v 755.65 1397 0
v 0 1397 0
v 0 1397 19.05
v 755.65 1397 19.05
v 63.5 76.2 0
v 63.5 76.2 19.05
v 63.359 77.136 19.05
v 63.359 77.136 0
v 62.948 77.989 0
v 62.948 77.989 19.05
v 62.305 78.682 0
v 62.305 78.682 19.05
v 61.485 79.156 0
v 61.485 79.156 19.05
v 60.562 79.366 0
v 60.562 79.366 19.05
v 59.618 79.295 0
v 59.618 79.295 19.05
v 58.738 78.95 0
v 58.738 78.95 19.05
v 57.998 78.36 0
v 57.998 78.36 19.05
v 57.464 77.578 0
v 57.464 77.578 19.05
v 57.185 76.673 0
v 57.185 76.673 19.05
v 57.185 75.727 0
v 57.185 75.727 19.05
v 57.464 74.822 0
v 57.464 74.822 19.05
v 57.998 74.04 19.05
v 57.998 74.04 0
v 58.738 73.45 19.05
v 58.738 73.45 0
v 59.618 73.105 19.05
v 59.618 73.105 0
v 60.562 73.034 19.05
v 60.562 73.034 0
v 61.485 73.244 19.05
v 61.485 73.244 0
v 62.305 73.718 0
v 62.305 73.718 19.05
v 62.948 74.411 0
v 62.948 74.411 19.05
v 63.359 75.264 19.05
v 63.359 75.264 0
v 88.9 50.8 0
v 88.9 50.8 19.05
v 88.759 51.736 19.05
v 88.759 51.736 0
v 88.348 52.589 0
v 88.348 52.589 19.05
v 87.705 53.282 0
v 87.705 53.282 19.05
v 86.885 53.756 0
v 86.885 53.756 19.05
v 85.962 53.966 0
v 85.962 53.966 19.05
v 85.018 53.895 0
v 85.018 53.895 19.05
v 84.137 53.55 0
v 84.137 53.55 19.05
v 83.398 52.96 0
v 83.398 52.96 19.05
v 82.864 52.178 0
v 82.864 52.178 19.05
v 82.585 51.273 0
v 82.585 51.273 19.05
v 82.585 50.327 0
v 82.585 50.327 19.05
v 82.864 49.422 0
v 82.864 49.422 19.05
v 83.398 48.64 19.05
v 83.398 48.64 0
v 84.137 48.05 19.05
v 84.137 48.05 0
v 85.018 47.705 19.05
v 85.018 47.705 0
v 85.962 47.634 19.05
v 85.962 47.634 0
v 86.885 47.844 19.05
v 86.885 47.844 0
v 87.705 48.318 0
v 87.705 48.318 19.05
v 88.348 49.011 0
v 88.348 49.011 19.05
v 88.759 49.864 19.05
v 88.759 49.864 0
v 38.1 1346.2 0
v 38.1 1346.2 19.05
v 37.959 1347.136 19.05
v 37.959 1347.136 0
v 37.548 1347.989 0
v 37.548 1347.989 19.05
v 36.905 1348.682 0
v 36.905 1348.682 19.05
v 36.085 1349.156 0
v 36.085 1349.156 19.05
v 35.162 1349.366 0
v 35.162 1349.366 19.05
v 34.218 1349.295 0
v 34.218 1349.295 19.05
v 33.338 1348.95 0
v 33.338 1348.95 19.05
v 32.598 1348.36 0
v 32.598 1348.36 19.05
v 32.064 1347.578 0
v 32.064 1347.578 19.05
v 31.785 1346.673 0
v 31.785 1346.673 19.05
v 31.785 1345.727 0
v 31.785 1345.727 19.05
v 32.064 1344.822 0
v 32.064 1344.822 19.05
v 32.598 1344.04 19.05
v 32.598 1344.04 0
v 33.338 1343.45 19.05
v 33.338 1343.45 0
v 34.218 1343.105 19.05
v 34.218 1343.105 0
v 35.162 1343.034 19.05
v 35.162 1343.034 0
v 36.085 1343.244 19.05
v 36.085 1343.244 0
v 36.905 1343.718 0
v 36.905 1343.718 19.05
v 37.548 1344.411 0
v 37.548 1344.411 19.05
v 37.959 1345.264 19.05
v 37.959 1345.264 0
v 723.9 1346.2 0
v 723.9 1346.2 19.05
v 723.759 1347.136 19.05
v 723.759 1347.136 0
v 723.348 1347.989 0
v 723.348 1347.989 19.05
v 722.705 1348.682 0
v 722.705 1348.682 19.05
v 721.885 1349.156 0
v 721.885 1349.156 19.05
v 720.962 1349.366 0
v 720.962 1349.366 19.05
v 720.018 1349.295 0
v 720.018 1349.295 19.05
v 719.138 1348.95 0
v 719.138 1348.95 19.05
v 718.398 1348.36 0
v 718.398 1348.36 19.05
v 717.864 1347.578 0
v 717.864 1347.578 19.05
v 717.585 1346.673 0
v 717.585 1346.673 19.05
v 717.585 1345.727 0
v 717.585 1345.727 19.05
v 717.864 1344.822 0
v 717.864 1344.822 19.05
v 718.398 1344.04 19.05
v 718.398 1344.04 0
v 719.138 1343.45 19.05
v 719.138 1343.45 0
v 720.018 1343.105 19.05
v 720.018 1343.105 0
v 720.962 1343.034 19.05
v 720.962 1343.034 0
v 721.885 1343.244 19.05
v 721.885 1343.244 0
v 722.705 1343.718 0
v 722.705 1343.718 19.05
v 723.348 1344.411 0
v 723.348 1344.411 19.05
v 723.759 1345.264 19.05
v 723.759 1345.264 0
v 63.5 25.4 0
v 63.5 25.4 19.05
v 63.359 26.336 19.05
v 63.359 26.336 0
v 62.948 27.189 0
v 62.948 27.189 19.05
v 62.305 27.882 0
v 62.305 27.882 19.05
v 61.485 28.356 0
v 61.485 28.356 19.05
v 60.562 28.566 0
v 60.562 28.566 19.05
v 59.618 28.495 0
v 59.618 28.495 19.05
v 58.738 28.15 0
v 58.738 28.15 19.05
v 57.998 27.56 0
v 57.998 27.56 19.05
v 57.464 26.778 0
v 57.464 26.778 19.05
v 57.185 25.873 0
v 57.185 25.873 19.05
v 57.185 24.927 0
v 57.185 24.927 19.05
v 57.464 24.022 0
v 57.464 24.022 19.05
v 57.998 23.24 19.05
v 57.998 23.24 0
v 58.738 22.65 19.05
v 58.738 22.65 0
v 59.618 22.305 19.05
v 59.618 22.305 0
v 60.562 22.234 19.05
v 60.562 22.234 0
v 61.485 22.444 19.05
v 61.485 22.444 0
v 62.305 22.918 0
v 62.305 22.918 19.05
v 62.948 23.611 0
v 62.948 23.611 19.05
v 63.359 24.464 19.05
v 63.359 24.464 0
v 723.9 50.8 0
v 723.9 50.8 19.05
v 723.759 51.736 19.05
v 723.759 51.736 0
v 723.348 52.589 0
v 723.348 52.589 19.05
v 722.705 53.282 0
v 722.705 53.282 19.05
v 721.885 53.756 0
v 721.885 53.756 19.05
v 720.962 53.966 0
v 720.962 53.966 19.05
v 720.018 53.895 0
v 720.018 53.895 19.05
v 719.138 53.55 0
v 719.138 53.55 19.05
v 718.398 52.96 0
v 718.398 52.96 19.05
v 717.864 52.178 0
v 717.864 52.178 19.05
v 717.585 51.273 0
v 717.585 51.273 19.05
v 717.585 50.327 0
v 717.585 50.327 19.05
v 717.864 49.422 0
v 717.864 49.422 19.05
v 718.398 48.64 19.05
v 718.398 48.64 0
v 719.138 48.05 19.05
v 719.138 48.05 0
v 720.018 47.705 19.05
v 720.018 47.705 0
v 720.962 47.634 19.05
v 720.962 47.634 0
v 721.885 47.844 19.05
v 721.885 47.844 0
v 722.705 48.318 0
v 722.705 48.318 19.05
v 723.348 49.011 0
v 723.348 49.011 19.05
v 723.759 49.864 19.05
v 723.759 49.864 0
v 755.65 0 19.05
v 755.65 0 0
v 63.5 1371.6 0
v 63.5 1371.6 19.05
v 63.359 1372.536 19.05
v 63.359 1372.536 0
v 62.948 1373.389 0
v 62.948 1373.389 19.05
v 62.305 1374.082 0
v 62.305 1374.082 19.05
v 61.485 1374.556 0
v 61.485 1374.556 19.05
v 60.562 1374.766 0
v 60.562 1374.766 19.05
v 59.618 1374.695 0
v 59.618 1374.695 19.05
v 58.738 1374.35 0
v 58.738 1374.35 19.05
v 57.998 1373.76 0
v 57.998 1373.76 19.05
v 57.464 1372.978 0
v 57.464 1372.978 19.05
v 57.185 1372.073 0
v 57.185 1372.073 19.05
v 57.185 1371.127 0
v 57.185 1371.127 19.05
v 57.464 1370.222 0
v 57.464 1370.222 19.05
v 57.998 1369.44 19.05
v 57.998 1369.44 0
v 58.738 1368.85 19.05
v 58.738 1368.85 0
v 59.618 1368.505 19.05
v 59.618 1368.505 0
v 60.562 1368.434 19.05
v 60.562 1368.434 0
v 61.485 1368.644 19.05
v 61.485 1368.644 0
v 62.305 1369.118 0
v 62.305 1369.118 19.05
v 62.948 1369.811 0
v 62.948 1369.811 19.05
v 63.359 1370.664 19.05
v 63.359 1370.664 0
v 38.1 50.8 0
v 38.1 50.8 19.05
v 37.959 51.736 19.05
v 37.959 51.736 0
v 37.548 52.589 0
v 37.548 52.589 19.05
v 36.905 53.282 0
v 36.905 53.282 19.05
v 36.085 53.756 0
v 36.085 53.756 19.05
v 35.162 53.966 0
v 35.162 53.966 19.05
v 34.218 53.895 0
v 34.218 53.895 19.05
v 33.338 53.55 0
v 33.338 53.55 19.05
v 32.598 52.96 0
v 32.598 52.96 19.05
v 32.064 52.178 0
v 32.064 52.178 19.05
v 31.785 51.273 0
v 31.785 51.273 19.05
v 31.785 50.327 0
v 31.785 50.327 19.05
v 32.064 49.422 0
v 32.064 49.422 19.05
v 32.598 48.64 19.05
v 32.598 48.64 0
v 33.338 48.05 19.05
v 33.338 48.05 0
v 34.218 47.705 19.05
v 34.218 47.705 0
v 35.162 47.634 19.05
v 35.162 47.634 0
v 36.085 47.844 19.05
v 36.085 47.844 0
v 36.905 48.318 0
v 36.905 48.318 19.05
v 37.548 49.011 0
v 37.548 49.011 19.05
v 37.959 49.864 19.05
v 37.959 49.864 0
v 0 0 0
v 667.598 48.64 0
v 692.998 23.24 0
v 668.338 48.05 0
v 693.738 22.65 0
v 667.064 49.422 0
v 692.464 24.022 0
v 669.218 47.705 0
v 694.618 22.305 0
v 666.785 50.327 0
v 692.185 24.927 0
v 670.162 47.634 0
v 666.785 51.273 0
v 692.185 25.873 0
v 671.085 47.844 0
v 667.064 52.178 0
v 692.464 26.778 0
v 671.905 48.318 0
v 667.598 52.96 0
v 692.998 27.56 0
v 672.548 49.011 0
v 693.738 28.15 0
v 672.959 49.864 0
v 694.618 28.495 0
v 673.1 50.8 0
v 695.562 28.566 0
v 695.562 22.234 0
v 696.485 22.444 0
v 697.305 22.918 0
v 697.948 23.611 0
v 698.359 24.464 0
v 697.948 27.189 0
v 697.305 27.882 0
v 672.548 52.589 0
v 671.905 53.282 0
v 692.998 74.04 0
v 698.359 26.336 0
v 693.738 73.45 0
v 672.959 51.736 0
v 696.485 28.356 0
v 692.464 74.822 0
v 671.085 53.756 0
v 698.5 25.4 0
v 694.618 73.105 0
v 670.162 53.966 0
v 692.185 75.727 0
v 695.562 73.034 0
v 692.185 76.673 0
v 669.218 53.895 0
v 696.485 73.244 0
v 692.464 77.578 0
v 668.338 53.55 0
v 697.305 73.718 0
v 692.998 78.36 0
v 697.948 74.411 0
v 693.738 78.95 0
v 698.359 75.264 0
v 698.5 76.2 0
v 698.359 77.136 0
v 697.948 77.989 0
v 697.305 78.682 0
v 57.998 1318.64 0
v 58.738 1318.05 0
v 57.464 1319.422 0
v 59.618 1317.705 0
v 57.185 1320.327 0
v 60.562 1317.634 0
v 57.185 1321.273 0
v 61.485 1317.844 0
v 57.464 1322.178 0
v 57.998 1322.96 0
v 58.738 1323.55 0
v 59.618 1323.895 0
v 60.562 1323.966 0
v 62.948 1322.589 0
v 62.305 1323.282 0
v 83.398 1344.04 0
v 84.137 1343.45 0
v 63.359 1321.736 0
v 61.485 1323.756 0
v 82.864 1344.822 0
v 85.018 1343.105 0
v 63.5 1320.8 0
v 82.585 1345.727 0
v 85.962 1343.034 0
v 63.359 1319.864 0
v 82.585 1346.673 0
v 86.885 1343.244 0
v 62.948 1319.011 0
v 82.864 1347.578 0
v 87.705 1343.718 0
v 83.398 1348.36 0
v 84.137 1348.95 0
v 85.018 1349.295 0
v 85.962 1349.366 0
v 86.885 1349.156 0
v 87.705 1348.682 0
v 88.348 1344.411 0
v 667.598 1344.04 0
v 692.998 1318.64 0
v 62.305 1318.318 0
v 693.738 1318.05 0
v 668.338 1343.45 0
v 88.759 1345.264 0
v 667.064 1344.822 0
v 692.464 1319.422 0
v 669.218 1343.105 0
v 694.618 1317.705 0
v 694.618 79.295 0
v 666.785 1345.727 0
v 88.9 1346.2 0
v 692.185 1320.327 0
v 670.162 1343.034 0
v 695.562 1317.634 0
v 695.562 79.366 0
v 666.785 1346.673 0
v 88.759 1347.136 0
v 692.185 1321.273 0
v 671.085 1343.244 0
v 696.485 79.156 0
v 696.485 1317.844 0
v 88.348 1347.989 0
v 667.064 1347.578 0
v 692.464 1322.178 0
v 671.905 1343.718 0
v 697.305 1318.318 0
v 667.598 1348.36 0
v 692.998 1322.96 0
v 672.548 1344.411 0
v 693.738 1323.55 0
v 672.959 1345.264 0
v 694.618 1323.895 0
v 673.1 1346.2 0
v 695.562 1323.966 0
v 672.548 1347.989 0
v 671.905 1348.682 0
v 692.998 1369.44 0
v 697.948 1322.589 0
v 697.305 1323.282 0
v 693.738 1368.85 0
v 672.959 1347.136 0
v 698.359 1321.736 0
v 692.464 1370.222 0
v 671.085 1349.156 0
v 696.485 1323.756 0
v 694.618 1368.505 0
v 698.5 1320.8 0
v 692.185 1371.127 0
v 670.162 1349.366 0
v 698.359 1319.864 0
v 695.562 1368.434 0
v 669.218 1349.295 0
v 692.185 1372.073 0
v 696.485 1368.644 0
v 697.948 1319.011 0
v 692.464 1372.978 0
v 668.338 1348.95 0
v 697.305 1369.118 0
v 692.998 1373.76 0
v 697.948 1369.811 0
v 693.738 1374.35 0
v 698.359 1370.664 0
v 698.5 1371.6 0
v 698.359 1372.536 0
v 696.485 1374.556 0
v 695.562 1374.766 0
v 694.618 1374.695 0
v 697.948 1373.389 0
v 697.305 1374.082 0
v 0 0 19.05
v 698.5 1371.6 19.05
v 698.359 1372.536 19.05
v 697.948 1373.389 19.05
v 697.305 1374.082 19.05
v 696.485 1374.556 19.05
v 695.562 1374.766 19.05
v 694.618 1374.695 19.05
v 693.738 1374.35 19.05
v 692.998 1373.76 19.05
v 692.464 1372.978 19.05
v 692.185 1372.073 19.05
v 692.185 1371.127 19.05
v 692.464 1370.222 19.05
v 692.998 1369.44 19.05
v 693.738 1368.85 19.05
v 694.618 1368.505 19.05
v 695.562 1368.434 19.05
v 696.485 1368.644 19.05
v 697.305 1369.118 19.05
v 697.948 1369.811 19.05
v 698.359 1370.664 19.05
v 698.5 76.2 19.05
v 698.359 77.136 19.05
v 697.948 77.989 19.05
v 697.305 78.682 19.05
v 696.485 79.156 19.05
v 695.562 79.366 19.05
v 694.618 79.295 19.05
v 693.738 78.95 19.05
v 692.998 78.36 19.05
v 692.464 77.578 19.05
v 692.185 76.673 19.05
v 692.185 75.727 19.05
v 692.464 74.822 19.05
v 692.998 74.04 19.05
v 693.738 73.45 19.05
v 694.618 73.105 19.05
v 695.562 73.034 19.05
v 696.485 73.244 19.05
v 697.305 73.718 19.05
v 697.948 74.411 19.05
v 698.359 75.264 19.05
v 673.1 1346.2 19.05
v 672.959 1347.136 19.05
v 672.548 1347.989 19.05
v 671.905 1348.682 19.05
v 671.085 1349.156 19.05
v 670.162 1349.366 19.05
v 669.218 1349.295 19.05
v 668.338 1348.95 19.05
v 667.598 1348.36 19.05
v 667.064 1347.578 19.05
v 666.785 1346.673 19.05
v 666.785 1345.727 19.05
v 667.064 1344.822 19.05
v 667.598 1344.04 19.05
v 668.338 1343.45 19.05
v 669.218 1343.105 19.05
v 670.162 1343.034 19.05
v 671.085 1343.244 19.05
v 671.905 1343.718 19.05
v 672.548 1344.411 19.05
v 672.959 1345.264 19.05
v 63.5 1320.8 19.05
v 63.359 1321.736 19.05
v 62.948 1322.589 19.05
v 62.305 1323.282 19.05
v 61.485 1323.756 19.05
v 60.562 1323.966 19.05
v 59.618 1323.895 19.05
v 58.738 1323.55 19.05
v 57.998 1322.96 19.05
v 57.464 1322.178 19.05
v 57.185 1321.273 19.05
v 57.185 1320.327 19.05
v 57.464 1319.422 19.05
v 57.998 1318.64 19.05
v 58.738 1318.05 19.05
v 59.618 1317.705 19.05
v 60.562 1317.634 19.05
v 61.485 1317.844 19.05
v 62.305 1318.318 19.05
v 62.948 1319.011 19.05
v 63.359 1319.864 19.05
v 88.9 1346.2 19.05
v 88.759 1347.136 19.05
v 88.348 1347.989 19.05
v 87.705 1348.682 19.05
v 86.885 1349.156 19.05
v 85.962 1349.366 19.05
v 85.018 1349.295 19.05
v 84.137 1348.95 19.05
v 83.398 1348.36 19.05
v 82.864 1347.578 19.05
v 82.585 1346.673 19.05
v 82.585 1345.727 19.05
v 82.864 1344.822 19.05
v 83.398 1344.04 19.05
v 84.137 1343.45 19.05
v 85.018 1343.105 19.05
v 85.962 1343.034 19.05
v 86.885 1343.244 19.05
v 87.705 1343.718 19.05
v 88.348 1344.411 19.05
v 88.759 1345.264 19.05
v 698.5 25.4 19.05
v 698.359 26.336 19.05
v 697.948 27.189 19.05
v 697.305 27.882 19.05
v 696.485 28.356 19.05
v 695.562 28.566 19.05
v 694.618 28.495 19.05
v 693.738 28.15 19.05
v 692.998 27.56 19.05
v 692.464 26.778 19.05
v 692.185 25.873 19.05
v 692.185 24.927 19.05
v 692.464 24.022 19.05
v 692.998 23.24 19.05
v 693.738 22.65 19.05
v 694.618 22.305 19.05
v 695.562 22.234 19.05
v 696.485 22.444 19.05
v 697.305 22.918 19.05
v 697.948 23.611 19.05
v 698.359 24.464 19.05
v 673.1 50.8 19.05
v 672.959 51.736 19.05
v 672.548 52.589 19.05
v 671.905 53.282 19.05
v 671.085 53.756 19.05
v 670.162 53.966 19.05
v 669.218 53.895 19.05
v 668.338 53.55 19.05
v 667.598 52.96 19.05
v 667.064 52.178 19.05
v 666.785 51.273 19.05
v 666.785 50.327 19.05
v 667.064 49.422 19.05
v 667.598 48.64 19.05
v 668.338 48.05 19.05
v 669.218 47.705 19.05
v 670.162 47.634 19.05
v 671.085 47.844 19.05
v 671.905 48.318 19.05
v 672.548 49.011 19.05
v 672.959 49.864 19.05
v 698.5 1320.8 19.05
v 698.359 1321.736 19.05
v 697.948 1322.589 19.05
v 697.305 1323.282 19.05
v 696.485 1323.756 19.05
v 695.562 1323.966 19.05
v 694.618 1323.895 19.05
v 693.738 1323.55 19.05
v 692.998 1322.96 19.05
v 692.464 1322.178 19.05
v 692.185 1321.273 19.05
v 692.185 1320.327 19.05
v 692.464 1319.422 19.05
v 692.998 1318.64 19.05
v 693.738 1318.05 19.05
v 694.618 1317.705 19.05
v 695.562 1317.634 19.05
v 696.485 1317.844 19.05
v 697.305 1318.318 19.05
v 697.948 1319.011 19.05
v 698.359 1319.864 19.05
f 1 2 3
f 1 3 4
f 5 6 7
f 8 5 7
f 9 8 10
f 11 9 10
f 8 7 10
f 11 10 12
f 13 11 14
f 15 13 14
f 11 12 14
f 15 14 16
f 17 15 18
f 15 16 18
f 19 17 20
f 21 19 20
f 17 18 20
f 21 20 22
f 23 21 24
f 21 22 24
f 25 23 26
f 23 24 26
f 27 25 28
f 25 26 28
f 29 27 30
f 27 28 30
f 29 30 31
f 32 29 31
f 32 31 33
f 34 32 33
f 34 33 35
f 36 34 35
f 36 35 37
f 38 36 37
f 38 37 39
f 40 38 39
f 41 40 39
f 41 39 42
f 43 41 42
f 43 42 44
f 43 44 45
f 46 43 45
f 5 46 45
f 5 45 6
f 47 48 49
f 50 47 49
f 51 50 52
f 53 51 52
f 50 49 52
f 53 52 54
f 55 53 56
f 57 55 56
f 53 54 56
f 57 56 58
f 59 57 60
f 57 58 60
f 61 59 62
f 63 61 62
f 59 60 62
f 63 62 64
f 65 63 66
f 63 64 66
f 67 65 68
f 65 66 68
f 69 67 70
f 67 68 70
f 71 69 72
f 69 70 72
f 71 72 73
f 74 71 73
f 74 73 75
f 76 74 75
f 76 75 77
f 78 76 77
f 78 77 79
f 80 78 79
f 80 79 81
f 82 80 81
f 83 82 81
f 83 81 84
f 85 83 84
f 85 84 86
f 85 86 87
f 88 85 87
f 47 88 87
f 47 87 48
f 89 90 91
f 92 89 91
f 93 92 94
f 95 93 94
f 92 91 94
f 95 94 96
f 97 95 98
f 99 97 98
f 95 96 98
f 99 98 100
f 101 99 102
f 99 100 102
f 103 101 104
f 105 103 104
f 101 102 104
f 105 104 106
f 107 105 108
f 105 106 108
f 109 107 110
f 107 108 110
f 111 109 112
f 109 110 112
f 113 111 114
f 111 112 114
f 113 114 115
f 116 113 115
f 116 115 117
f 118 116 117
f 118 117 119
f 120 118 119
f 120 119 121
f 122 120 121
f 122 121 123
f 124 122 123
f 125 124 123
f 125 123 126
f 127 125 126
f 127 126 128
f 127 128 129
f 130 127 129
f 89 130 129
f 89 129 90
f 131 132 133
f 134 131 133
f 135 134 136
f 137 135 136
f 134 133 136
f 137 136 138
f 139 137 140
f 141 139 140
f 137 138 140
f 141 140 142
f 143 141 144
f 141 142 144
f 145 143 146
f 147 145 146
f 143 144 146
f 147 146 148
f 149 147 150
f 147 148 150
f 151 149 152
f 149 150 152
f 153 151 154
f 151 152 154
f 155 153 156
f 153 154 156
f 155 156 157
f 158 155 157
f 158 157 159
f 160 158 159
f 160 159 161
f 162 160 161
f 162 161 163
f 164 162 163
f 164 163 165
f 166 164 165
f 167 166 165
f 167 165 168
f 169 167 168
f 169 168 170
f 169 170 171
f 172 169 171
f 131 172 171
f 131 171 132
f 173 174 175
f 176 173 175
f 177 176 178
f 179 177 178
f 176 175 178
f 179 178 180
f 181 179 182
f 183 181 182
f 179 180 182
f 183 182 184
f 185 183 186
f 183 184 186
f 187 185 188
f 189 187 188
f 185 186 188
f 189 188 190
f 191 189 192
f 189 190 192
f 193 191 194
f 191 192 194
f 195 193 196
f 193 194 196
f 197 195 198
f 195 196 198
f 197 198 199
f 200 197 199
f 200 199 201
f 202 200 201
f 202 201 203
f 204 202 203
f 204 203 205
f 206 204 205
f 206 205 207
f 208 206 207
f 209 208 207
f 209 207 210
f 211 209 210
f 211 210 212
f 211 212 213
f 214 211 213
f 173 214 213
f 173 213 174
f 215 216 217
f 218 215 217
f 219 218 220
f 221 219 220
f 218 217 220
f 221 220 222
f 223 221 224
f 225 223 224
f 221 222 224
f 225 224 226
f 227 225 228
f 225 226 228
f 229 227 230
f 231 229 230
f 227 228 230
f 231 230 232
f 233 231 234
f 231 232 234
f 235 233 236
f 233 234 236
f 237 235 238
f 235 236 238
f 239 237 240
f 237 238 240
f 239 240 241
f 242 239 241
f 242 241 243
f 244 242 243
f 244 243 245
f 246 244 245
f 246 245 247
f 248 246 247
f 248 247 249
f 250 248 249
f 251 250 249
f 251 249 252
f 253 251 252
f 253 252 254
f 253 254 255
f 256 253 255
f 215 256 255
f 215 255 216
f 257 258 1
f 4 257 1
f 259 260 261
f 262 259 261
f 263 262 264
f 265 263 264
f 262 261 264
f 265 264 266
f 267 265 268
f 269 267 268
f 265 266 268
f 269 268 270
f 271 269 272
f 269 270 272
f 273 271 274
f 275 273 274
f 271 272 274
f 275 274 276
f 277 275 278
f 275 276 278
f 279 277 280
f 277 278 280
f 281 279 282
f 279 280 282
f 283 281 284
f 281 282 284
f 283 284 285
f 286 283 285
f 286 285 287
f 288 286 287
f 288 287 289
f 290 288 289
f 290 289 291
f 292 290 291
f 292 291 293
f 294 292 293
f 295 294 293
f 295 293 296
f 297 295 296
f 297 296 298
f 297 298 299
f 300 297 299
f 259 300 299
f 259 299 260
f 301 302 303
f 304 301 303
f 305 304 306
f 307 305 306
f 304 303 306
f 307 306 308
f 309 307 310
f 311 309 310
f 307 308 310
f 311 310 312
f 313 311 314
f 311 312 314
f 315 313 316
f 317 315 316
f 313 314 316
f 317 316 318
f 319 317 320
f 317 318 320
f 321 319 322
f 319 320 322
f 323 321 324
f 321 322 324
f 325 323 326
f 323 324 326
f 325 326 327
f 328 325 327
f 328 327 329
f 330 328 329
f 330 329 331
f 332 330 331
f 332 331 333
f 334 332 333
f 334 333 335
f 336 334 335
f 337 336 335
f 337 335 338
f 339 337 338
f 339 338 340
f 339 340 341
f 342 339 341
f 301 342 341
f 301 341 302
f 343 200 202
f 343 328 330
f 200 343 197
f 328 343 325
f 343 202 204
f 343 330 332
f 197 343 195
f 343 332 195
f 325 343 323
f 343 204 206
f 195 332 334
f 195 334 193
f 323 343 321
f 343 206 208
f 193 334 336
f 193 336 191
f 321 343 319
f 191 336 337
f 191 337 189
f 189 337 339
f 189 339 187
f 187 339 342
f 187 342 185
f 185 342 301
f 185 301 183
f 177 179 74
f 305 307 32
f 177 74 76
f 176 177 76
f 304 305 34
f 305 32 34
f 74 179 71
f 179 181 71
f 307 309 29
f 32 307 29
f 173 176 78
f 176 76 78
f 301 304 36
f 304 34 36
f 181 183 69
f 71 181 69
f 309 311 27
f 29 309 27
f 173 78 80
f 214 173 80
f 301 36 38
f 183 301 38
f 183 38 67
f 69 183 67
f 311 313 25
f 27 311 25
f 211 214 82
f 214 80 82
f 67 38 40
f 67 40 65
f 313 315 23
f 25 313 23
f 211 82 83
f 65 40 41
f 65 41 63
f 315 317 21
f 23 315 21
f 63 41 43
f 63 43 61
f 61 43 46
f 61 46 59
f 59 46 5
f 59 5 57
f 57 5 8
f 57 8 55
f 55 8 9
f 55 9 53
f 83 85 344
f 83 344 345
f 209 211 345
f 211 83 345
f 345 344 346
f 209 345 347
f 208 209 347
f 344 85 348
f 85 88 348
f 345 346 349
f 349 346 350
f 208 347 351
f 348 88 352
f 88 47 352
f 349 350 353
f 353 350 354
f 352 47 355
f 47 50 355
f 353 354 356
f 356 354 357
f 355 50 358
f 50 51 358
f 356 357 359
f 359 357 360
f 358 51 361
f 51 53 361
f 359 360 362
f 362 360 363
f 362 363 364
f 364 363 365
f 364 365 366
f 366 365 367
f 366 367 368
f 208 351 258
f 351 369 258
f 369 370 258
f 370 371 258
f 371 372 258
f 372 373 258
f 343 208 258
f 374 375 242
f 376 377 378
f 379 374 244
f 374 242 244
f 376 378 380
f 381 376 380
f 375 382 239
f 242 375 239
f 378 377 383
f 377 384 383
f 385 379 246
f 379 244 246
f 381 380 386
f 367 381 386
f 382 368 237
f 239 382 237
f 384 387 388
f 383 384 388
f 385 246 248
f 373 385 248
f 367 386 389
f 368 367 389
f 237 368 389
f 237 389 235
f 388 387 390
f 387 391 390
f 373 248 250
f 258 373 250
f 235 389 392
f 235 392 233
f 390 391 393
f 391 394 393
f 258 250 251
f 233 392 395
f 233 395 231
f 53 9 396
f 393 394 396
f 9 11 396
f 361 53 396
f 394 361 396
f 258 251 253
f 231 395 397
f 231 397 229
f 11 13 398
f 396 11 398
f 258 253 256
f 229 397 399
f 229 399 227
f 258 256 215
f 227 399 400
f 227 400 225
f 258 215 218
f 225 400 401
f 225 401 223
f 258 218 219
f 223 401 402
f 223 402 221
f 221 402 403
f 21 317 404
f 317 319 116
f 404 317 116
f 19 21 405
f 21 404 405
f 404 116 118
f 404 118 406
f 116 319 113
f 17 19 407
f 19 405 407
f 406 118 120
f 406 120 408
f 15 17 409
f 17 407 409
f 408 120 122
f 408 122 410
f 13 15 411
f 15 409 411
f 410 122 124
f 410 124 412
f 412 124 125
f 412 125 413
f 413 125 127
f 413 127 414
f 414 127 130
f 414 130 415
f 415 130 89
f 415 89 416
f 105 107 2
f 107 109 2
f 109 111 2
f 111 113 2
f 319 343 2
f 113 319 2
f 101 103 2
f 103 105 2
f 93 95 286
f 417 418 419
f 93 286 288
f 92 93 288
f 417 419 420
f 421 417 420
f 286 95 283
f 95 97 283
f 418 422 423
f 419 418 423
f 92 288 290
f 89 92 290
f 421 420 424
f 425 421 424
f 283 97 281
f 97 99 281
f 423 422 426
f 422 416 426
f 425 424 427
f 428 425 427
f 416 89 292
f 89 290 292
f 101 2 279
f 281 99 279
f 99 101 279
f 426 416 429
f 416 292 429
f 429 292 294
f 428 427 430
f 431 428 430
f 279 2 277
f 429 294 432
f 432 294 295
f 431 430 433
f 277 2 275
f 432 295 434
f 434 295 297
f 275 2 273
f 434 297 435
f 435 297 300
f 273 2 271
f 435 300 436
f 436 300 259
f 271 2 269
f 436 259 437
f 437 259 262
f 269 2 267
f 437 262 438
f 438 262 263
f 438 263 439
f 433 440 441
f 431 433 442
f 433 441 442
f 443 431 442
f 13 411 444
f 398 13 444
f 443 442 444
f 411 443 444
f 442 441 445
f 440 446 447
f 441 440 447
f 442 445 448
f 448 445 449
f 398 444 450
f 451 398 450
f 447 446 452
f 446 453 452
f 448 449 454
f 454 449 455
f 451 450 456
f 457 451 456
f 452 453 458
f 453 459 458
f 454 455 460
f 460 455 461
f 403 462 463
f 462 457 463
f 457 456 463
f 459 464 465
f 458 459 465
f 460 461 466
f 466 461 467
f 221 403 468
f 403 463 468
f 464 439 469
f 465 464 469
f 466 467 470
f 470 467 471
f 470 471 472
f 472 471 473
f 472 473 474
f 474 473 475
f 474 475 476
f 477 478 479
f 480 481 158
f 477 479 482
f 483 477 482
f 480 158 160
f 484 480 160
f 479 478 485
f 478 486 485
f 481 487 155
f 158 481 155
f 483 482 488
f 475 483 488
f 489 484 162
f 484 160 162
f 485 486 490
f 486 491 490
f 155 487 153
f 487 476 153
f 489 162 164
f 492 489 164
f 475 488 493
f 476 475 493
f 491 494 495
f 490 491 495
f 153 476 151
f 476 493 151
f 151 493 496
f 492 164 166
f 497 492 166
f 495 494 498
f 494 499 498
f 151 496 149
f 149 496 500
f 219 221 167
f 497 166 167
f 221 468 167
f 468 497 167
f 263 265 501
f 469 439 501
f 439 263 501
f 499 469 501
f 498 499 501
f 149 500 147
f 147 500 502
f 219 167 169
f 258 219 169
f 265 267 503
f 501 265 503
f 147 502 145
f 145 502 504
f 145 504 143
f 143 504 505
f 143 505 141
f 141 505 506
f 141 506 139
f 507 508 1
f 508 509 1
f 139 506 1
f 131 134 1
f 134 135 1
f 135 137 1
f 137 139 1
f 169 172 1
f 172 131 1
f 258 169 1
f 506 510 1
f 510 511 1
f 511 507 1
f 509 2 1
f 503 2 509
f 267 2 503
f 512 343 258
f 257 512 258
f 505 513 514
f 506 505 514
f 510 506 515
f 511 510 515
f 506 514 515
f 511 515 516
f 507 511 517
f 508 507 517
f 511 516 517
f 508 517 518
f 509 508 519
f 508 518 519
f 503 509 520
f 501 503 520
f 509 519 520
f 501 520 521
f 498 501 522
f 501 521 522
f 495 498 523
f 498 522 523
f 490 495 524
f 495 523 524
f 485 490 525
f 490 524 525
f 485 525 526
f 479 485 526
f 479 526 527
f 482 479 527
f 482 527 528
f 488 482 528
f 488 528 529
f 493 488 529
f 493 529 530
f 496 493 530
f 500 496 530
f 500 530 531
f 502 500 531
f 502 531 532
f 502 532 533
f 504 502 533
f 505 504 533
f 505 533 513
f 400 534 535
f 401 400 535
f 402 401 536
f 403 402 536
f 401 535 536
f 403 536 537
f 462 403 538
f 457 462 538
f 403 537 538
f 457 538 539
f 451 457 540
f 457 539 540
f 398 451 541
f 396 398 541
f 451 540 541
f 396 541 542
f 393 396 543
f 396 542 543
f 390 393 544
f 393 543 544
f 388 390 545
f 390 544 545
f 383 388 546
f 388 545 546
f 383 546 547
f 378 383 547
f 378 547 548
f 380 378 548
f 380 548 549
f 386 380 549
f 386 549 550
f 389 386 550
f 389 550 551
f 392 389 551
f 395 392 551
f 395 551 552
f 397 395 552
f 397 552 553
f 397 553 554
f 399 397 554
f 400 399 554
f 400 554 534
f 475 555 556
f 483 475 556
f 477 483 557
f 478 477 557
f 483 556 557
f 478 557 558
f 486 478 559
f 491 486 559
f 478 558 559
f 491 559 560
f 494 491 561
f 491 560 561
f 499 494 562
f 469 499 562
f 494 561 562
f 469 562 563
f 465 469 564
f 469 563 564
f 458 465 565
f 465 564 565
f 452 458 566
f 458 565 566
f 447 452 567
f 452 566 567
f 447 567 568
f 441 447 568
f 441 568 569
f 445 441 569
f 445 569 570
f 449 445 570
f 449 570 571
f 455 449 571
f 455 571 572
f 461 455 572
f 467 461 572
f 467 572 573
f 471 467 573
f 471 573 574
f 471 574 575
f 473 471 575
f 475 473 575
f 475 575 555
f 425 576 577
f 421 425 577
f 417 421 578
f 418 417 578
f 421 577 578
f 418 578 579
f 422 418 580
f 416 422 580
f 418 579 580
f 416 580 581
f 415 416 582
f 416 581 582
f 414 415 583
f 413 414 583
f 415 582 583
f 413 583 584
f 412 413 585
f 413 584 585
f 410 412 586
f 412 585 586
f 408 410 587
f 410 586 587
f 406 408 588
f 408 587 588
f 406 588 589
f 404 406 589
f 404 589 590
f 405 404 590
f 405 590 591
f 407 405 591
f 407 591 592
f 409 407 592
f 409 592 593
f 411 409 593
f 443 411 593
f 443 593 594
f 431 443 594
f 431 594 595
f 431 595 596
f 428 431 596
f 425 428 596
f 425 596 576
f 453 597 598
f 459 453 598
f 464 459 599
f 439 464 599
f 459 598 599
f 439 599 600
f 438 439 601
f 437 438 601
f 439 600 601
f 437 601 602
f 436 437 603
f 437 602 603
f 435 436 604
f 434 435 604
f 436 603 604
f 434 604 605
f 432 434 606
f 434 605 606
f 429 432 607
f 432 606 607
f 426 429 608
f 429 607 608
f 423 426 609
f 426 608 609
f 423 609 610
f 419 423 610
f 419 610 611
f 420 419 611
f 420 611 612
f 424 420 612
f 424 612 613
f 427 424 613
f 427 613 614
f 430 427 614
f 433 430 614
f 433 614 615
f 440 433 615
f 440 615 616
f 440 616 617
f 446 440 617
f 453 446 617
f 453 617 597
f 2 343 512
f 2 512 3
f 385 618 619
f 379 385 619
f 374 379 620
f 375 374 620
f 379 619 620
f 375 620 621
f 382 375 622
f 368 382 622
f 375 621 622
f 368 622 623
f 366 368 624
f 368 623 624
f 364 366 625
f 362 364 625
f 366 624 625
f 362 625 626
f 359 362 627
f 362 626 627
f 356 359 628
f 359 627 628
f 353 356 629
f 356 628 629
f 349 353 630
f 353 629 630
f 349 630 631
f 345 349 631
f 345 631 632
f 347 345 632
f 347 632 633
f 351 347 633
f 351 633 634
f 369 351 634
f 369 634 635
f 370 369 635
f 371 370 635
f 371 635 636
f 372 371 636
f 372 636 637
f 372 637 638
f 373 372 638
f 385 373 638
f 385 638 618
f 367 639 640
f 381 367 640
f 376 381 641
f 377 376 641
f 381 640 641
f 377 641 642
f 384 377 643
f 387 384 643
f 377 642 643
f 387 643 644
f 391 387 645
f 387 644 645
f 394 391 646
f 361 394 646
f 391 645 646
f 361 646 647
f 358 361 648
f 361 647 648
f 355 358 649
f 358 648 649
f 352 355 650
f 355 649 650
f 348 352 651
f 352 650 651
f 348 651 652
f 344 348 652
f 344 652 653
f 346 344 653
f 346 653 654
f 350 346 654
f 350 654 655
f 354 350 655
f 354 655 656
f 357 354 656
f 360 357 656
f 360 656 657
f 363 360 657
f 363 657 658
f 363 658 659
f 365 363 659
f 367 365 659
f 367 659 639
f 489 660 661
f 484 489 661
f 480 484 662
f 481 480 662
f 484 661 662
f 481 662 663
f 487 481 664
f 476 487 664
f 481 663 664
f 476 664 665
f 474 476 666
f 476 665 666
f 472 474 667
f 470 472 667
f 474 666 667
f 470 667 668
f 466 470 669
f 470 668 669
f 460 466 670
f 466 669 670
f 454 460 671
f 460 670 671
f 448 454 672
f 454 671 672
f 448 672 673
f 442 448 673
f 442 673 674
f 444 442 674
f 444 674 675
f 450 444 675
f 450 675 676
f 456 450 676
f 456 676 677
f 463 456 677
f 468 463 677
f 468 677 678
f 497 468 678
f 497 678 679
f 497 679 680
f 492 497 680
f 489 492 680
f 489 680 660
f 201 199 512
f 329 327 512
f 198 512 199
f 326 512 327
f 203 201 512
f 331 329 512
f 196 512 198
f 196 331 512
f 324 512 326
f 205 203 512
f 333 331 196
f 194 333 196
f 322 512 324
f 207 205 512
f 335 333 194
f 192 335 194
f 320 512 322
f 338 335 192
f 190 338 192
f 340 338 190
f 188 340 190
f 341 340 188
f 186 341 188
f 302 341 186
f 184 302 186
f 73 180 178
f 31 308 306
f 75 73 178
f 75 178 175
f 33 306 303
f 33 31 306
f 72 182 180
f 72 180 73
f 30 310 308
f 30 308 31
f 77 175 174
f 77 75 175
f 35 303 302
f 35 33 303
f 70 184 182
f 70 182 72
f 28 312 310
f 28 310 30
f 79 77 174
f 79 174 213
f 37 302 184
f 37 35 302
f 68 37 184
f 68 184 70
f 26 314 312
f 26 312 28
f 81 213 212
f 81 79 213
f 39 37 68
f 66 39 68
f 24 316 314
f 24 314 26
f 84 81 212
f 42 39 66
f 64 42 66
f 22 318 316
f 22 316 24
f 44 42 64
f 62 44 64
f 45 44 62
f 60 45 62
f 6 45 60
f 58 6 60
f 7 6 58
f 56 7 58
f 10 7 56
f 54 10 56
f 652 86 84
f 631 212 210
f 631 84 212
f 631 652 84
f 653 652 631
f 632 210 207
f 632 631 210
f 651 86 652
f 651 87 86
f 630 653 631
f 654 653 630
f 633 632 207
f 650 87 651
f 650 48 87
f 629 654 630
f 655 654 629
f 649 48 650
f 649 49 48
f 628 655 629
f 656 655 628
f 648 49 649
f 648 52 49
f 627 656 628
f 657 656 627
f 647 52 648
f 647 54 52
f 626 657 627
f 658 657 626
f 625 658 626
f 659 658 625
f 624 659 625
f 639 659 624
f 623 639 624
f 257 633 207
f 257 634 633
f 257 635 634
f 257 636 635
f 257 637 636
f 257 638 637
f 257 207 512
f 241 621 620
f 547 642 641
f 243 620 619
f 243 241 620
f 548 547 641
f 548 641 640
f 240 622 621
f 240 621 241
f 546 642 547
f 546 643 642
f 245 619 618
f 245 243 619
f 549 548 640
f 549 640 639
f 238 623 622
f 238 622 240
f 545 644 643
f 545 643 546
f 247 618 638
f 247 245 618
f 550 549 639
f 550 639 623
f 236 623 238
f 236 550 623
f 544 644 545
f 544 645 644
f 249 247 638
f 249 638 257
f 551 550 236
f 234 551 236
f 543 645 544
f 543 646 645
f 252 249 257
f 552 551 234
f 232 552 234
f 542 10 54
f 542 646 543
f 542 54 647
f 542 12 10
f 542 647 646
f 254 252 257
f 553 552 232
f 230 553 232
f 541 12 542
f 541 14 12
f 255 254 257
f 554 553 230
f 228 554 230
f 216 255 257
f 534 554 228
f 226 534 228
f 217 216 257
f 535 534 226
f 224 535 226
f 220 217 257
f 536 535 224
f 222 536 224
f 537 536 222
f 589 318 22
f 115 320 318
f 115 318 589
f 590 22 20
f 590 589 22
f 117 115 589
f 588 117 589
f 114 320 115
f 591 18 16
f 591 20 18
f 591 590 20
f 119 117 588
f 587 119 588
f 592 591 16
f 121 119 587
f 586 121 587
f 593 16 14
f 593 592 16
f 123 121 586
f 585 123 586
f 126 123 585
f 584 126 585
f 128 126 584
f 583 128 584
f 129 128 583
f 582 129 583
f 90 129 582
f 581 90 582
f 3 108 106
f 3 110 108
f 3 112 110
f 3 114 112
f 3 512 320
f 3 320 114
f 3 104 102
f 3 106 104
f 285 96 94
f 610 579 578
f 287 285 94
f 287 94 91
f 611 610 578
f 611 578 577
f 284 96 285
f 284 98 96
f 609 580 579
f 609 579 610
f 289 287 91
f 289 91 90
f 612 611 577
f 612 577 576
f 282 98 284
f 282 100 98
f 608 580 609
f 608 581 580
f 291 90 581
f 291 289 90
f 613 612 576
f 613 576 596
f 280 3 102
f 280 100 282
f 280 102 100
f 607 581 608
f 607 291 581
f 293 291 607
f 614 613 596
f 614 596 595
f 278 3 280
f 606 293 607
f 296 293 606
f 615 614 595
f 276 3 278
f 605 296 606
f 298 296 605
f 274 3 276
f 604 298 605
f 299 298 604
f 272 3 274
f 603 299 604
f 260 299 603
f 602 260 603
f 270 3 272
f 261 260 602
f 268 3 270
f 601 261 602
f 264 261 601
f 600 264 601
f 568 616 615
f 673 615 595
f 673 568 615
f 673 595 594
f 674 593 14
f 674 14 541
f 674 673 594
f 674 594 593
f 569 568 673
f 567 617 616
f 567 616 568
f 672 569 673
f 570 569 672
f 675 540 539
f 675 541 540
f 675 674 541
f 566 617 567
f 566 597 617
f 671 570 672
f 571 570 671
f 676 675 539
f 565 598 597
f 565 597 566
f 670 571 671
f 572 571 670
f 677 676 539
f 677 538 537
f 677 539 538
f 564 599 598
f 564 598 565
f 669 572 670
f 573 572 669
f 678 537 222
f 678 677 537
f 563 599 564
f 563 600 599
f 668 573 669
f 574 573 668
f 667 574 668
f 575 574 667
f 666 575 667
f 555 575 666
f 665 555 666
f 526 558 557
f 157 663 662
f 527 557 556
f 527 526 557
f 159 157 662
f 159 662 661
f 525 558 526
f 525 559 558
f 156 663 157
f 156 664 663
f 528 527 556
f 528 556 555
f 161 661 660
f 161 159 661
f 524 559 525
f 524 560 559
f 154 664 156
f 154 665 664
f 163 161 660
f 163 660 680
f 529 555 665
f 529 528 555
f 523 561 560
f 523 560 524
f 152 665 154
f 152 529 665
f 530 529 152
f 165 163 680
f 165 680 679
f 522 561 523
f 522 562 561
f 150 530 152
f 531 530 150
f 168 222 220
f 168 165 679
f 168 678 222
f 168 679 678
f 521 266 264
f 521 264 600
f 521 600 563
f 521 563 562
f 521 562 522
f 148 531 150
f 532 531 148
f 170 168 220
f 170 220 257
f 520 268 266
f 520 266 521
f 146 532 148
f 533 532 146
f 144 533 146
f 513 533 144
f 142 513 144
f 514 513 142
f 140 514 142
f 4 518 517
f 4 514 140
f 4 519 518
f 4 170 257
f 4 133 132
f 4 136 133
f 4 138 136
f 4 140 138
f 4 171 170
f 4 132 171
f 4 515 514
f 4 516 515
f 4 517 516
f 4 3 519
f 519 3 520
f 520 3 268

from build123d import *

# Parameters (mm, degrees)
SKETCH1_W           = 755.65
SKETCH1_H           = 1397
BOSS_EXTRUDE1_DEPTH = 19.05
SKETCH2_R           = 3.175
CUT_EXTRUDE1_DEPTH  = 25.4


with BuildPart() as part:
    # Sketch1 → Boss-Extrude1 (new body)
    with BuildSketch(Plane.XY):
        with Locations((377.825, 698.5)):
            Rectangle(SKETCH1_W, SKETCH1_H)
    extrude(amount=BOSS_EXTRUDE1_DEPTH)

    # Sketch2 → Cut-Extrude1 (cut)
    with BuildSketch(Plane.XY.offset(19.05)):
        with Locations((60.325, 76.2)):
            Circle(SKETCH2_R)
        with Locations((60.325, 25.4)):
            Circle(SKETCH2_R)
        with Locations((34.925, 50.8)):
            Circle(SKETCH2_R)
        with Locations((85.725, 50.8)):
            Circle(SKETCH2_R)
        with Locations((669.925, 50.8)):
            Circle(SKETCH2_R)
        with Locations((720.725, 50.8)):
            Circle(SKETCH2_R)
        with Locations((695.325, 25.4)):
            Circle(SKETCH2_R)
        with Locations((695.325, 76.2)):
            Circle(SKETCH2_R)
        with Locations((695.325, 1320.8)):
            Circle(SKETCH2_R)
        with Locations((695.325, 1371.6)):
            Circle(SKETCH2_R)
        with Locations((720.725, 1346.2)):
            Circle(SKETCH2_R)
        with Locations((669.925, 1346.2)):
            Circle(SKETCH2_R)
        with Locations((85.725, 1346.2)):
            Circle(SKETCH2_R)
        with Locations((34.925, 1346.2)):
            Circle(SKETCH2_R)
        with Locations((60.325, 1371.6)):
            Circle(SKETCH2_R)
        with Locations((60.325, 1320.8)):
            Circle(SKETCH2_R)
    extrude(amount=-CUT_EXTRUDE1_DEPTH, mode=Mode.SUBTRACT)


solid = part.part
